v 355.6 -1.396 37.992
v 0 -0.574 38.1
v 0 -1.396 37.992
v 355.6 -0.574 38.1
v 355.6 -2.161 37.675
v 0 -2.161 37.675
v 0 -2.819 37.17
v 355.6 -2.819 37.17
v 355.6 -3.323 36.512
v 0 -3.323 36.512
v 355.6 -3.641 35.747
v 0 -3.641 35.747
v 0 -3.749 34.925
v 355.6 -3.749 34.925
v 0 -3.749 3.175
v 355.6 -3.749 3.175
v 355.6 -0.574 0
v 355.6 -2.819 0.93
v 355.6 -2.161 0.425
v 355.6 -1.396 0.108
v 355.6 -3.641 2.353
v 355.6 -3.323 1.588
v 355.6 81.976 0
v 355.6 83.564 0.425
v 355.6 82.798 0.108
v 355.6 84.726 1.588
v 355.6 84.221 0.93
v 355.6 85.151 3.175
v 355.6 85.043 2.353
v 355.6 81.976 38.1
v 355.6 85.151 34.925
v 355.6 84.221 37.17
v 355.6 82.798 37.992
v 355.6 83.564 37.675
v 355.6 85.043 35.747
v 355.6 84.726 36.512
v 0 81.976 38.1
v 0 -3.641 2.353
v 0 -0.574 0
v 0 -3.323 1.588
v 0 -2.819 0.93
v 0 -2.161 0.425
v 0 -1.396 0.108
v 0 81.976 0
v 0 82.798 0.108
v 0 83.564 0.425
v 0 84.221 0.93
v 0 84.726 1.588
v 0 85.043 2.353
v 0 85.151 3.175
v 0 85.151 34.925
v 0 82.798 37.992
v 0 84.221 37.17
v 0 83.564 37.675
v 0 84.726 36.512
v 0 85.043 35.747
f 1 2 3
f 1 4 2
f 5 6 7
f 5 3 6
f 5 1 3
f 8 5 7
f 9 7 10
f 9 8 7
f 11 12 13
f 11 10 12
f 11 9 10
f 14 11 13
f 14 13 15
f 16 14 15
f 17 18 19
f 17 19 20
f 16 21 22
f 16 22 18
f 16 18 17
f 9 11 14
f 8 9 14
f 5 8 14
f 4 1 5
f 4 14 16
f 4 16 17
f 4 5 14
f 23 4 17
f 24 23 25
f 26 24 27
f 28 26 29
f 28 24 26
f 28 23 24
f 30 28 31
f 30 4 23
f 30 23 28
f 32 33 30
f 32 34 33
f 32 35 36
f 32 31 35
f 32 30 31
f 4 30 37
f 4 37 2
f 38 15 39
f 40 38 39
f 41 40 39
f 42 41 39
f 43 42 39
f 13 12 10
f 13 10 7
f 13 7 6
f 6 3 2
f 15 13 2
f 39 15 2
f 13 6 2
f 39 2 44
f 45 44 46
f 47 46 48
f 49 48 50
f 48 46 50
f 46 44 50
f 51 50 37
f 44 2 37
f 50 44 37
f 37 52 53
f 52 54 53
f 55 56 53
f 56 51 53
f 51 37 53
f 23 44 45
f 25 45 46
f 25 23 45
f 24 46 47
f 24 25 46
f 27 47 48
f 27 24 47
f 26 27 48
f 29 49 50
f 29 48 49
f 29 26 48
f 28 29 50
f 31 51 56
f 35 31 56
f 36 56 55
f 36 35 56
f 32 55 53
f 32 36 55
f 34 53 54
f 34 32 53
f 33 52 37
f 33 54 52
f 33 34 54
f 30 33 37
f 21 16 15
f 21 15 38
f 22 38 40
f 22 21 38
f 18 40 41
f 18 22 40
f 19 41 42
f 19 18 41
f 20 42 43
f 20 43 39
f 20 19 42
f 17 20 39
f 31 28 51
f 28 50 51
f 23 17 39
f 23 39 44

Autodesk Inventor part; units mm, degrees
ref_plane "YZ Plane" through (0, 0, 0) normal (1, 0, 0) x (0, 1, 0)
ref_plane "XZ Plane" through (0, 0, 0) normal (0, 1, 0) x (-1, 0, 0)
ref_plane "XY Plane" through (0, 0, 0) normal (0, 0, 1) x (1, 0, 0)
sketch "Sketch1" plane through (0, 0, 0) normal (1, 0, 0) x (0, 1, 0)
  line L0 (-3.7488, 0) -> (85.1512, 0)
  line L1 (85.1512, 0) -> (85.1512, 38.1)
  line L2 (85.1512, 38.1) -> (-3.7488, 38.1)
  line L3 (-3.7488, 38.1) -> (-3.7488, 0)
  point P0 (0, 0)
  dimension "d0" = 88.9
  dimension "d1" = 38.1
extrude "Extrusion1" add sketch "Sketch1" along normal blind 355.6
fillet "Fillet1" radius 3.175 4 edges at (177.8, 85.1512, 38.1) (177.8, 85.1512, 0) (177.8, -3.7488, 0) (177.8, -3.7488, 38.1)
properties part number "2x4x14" material "Ash"
